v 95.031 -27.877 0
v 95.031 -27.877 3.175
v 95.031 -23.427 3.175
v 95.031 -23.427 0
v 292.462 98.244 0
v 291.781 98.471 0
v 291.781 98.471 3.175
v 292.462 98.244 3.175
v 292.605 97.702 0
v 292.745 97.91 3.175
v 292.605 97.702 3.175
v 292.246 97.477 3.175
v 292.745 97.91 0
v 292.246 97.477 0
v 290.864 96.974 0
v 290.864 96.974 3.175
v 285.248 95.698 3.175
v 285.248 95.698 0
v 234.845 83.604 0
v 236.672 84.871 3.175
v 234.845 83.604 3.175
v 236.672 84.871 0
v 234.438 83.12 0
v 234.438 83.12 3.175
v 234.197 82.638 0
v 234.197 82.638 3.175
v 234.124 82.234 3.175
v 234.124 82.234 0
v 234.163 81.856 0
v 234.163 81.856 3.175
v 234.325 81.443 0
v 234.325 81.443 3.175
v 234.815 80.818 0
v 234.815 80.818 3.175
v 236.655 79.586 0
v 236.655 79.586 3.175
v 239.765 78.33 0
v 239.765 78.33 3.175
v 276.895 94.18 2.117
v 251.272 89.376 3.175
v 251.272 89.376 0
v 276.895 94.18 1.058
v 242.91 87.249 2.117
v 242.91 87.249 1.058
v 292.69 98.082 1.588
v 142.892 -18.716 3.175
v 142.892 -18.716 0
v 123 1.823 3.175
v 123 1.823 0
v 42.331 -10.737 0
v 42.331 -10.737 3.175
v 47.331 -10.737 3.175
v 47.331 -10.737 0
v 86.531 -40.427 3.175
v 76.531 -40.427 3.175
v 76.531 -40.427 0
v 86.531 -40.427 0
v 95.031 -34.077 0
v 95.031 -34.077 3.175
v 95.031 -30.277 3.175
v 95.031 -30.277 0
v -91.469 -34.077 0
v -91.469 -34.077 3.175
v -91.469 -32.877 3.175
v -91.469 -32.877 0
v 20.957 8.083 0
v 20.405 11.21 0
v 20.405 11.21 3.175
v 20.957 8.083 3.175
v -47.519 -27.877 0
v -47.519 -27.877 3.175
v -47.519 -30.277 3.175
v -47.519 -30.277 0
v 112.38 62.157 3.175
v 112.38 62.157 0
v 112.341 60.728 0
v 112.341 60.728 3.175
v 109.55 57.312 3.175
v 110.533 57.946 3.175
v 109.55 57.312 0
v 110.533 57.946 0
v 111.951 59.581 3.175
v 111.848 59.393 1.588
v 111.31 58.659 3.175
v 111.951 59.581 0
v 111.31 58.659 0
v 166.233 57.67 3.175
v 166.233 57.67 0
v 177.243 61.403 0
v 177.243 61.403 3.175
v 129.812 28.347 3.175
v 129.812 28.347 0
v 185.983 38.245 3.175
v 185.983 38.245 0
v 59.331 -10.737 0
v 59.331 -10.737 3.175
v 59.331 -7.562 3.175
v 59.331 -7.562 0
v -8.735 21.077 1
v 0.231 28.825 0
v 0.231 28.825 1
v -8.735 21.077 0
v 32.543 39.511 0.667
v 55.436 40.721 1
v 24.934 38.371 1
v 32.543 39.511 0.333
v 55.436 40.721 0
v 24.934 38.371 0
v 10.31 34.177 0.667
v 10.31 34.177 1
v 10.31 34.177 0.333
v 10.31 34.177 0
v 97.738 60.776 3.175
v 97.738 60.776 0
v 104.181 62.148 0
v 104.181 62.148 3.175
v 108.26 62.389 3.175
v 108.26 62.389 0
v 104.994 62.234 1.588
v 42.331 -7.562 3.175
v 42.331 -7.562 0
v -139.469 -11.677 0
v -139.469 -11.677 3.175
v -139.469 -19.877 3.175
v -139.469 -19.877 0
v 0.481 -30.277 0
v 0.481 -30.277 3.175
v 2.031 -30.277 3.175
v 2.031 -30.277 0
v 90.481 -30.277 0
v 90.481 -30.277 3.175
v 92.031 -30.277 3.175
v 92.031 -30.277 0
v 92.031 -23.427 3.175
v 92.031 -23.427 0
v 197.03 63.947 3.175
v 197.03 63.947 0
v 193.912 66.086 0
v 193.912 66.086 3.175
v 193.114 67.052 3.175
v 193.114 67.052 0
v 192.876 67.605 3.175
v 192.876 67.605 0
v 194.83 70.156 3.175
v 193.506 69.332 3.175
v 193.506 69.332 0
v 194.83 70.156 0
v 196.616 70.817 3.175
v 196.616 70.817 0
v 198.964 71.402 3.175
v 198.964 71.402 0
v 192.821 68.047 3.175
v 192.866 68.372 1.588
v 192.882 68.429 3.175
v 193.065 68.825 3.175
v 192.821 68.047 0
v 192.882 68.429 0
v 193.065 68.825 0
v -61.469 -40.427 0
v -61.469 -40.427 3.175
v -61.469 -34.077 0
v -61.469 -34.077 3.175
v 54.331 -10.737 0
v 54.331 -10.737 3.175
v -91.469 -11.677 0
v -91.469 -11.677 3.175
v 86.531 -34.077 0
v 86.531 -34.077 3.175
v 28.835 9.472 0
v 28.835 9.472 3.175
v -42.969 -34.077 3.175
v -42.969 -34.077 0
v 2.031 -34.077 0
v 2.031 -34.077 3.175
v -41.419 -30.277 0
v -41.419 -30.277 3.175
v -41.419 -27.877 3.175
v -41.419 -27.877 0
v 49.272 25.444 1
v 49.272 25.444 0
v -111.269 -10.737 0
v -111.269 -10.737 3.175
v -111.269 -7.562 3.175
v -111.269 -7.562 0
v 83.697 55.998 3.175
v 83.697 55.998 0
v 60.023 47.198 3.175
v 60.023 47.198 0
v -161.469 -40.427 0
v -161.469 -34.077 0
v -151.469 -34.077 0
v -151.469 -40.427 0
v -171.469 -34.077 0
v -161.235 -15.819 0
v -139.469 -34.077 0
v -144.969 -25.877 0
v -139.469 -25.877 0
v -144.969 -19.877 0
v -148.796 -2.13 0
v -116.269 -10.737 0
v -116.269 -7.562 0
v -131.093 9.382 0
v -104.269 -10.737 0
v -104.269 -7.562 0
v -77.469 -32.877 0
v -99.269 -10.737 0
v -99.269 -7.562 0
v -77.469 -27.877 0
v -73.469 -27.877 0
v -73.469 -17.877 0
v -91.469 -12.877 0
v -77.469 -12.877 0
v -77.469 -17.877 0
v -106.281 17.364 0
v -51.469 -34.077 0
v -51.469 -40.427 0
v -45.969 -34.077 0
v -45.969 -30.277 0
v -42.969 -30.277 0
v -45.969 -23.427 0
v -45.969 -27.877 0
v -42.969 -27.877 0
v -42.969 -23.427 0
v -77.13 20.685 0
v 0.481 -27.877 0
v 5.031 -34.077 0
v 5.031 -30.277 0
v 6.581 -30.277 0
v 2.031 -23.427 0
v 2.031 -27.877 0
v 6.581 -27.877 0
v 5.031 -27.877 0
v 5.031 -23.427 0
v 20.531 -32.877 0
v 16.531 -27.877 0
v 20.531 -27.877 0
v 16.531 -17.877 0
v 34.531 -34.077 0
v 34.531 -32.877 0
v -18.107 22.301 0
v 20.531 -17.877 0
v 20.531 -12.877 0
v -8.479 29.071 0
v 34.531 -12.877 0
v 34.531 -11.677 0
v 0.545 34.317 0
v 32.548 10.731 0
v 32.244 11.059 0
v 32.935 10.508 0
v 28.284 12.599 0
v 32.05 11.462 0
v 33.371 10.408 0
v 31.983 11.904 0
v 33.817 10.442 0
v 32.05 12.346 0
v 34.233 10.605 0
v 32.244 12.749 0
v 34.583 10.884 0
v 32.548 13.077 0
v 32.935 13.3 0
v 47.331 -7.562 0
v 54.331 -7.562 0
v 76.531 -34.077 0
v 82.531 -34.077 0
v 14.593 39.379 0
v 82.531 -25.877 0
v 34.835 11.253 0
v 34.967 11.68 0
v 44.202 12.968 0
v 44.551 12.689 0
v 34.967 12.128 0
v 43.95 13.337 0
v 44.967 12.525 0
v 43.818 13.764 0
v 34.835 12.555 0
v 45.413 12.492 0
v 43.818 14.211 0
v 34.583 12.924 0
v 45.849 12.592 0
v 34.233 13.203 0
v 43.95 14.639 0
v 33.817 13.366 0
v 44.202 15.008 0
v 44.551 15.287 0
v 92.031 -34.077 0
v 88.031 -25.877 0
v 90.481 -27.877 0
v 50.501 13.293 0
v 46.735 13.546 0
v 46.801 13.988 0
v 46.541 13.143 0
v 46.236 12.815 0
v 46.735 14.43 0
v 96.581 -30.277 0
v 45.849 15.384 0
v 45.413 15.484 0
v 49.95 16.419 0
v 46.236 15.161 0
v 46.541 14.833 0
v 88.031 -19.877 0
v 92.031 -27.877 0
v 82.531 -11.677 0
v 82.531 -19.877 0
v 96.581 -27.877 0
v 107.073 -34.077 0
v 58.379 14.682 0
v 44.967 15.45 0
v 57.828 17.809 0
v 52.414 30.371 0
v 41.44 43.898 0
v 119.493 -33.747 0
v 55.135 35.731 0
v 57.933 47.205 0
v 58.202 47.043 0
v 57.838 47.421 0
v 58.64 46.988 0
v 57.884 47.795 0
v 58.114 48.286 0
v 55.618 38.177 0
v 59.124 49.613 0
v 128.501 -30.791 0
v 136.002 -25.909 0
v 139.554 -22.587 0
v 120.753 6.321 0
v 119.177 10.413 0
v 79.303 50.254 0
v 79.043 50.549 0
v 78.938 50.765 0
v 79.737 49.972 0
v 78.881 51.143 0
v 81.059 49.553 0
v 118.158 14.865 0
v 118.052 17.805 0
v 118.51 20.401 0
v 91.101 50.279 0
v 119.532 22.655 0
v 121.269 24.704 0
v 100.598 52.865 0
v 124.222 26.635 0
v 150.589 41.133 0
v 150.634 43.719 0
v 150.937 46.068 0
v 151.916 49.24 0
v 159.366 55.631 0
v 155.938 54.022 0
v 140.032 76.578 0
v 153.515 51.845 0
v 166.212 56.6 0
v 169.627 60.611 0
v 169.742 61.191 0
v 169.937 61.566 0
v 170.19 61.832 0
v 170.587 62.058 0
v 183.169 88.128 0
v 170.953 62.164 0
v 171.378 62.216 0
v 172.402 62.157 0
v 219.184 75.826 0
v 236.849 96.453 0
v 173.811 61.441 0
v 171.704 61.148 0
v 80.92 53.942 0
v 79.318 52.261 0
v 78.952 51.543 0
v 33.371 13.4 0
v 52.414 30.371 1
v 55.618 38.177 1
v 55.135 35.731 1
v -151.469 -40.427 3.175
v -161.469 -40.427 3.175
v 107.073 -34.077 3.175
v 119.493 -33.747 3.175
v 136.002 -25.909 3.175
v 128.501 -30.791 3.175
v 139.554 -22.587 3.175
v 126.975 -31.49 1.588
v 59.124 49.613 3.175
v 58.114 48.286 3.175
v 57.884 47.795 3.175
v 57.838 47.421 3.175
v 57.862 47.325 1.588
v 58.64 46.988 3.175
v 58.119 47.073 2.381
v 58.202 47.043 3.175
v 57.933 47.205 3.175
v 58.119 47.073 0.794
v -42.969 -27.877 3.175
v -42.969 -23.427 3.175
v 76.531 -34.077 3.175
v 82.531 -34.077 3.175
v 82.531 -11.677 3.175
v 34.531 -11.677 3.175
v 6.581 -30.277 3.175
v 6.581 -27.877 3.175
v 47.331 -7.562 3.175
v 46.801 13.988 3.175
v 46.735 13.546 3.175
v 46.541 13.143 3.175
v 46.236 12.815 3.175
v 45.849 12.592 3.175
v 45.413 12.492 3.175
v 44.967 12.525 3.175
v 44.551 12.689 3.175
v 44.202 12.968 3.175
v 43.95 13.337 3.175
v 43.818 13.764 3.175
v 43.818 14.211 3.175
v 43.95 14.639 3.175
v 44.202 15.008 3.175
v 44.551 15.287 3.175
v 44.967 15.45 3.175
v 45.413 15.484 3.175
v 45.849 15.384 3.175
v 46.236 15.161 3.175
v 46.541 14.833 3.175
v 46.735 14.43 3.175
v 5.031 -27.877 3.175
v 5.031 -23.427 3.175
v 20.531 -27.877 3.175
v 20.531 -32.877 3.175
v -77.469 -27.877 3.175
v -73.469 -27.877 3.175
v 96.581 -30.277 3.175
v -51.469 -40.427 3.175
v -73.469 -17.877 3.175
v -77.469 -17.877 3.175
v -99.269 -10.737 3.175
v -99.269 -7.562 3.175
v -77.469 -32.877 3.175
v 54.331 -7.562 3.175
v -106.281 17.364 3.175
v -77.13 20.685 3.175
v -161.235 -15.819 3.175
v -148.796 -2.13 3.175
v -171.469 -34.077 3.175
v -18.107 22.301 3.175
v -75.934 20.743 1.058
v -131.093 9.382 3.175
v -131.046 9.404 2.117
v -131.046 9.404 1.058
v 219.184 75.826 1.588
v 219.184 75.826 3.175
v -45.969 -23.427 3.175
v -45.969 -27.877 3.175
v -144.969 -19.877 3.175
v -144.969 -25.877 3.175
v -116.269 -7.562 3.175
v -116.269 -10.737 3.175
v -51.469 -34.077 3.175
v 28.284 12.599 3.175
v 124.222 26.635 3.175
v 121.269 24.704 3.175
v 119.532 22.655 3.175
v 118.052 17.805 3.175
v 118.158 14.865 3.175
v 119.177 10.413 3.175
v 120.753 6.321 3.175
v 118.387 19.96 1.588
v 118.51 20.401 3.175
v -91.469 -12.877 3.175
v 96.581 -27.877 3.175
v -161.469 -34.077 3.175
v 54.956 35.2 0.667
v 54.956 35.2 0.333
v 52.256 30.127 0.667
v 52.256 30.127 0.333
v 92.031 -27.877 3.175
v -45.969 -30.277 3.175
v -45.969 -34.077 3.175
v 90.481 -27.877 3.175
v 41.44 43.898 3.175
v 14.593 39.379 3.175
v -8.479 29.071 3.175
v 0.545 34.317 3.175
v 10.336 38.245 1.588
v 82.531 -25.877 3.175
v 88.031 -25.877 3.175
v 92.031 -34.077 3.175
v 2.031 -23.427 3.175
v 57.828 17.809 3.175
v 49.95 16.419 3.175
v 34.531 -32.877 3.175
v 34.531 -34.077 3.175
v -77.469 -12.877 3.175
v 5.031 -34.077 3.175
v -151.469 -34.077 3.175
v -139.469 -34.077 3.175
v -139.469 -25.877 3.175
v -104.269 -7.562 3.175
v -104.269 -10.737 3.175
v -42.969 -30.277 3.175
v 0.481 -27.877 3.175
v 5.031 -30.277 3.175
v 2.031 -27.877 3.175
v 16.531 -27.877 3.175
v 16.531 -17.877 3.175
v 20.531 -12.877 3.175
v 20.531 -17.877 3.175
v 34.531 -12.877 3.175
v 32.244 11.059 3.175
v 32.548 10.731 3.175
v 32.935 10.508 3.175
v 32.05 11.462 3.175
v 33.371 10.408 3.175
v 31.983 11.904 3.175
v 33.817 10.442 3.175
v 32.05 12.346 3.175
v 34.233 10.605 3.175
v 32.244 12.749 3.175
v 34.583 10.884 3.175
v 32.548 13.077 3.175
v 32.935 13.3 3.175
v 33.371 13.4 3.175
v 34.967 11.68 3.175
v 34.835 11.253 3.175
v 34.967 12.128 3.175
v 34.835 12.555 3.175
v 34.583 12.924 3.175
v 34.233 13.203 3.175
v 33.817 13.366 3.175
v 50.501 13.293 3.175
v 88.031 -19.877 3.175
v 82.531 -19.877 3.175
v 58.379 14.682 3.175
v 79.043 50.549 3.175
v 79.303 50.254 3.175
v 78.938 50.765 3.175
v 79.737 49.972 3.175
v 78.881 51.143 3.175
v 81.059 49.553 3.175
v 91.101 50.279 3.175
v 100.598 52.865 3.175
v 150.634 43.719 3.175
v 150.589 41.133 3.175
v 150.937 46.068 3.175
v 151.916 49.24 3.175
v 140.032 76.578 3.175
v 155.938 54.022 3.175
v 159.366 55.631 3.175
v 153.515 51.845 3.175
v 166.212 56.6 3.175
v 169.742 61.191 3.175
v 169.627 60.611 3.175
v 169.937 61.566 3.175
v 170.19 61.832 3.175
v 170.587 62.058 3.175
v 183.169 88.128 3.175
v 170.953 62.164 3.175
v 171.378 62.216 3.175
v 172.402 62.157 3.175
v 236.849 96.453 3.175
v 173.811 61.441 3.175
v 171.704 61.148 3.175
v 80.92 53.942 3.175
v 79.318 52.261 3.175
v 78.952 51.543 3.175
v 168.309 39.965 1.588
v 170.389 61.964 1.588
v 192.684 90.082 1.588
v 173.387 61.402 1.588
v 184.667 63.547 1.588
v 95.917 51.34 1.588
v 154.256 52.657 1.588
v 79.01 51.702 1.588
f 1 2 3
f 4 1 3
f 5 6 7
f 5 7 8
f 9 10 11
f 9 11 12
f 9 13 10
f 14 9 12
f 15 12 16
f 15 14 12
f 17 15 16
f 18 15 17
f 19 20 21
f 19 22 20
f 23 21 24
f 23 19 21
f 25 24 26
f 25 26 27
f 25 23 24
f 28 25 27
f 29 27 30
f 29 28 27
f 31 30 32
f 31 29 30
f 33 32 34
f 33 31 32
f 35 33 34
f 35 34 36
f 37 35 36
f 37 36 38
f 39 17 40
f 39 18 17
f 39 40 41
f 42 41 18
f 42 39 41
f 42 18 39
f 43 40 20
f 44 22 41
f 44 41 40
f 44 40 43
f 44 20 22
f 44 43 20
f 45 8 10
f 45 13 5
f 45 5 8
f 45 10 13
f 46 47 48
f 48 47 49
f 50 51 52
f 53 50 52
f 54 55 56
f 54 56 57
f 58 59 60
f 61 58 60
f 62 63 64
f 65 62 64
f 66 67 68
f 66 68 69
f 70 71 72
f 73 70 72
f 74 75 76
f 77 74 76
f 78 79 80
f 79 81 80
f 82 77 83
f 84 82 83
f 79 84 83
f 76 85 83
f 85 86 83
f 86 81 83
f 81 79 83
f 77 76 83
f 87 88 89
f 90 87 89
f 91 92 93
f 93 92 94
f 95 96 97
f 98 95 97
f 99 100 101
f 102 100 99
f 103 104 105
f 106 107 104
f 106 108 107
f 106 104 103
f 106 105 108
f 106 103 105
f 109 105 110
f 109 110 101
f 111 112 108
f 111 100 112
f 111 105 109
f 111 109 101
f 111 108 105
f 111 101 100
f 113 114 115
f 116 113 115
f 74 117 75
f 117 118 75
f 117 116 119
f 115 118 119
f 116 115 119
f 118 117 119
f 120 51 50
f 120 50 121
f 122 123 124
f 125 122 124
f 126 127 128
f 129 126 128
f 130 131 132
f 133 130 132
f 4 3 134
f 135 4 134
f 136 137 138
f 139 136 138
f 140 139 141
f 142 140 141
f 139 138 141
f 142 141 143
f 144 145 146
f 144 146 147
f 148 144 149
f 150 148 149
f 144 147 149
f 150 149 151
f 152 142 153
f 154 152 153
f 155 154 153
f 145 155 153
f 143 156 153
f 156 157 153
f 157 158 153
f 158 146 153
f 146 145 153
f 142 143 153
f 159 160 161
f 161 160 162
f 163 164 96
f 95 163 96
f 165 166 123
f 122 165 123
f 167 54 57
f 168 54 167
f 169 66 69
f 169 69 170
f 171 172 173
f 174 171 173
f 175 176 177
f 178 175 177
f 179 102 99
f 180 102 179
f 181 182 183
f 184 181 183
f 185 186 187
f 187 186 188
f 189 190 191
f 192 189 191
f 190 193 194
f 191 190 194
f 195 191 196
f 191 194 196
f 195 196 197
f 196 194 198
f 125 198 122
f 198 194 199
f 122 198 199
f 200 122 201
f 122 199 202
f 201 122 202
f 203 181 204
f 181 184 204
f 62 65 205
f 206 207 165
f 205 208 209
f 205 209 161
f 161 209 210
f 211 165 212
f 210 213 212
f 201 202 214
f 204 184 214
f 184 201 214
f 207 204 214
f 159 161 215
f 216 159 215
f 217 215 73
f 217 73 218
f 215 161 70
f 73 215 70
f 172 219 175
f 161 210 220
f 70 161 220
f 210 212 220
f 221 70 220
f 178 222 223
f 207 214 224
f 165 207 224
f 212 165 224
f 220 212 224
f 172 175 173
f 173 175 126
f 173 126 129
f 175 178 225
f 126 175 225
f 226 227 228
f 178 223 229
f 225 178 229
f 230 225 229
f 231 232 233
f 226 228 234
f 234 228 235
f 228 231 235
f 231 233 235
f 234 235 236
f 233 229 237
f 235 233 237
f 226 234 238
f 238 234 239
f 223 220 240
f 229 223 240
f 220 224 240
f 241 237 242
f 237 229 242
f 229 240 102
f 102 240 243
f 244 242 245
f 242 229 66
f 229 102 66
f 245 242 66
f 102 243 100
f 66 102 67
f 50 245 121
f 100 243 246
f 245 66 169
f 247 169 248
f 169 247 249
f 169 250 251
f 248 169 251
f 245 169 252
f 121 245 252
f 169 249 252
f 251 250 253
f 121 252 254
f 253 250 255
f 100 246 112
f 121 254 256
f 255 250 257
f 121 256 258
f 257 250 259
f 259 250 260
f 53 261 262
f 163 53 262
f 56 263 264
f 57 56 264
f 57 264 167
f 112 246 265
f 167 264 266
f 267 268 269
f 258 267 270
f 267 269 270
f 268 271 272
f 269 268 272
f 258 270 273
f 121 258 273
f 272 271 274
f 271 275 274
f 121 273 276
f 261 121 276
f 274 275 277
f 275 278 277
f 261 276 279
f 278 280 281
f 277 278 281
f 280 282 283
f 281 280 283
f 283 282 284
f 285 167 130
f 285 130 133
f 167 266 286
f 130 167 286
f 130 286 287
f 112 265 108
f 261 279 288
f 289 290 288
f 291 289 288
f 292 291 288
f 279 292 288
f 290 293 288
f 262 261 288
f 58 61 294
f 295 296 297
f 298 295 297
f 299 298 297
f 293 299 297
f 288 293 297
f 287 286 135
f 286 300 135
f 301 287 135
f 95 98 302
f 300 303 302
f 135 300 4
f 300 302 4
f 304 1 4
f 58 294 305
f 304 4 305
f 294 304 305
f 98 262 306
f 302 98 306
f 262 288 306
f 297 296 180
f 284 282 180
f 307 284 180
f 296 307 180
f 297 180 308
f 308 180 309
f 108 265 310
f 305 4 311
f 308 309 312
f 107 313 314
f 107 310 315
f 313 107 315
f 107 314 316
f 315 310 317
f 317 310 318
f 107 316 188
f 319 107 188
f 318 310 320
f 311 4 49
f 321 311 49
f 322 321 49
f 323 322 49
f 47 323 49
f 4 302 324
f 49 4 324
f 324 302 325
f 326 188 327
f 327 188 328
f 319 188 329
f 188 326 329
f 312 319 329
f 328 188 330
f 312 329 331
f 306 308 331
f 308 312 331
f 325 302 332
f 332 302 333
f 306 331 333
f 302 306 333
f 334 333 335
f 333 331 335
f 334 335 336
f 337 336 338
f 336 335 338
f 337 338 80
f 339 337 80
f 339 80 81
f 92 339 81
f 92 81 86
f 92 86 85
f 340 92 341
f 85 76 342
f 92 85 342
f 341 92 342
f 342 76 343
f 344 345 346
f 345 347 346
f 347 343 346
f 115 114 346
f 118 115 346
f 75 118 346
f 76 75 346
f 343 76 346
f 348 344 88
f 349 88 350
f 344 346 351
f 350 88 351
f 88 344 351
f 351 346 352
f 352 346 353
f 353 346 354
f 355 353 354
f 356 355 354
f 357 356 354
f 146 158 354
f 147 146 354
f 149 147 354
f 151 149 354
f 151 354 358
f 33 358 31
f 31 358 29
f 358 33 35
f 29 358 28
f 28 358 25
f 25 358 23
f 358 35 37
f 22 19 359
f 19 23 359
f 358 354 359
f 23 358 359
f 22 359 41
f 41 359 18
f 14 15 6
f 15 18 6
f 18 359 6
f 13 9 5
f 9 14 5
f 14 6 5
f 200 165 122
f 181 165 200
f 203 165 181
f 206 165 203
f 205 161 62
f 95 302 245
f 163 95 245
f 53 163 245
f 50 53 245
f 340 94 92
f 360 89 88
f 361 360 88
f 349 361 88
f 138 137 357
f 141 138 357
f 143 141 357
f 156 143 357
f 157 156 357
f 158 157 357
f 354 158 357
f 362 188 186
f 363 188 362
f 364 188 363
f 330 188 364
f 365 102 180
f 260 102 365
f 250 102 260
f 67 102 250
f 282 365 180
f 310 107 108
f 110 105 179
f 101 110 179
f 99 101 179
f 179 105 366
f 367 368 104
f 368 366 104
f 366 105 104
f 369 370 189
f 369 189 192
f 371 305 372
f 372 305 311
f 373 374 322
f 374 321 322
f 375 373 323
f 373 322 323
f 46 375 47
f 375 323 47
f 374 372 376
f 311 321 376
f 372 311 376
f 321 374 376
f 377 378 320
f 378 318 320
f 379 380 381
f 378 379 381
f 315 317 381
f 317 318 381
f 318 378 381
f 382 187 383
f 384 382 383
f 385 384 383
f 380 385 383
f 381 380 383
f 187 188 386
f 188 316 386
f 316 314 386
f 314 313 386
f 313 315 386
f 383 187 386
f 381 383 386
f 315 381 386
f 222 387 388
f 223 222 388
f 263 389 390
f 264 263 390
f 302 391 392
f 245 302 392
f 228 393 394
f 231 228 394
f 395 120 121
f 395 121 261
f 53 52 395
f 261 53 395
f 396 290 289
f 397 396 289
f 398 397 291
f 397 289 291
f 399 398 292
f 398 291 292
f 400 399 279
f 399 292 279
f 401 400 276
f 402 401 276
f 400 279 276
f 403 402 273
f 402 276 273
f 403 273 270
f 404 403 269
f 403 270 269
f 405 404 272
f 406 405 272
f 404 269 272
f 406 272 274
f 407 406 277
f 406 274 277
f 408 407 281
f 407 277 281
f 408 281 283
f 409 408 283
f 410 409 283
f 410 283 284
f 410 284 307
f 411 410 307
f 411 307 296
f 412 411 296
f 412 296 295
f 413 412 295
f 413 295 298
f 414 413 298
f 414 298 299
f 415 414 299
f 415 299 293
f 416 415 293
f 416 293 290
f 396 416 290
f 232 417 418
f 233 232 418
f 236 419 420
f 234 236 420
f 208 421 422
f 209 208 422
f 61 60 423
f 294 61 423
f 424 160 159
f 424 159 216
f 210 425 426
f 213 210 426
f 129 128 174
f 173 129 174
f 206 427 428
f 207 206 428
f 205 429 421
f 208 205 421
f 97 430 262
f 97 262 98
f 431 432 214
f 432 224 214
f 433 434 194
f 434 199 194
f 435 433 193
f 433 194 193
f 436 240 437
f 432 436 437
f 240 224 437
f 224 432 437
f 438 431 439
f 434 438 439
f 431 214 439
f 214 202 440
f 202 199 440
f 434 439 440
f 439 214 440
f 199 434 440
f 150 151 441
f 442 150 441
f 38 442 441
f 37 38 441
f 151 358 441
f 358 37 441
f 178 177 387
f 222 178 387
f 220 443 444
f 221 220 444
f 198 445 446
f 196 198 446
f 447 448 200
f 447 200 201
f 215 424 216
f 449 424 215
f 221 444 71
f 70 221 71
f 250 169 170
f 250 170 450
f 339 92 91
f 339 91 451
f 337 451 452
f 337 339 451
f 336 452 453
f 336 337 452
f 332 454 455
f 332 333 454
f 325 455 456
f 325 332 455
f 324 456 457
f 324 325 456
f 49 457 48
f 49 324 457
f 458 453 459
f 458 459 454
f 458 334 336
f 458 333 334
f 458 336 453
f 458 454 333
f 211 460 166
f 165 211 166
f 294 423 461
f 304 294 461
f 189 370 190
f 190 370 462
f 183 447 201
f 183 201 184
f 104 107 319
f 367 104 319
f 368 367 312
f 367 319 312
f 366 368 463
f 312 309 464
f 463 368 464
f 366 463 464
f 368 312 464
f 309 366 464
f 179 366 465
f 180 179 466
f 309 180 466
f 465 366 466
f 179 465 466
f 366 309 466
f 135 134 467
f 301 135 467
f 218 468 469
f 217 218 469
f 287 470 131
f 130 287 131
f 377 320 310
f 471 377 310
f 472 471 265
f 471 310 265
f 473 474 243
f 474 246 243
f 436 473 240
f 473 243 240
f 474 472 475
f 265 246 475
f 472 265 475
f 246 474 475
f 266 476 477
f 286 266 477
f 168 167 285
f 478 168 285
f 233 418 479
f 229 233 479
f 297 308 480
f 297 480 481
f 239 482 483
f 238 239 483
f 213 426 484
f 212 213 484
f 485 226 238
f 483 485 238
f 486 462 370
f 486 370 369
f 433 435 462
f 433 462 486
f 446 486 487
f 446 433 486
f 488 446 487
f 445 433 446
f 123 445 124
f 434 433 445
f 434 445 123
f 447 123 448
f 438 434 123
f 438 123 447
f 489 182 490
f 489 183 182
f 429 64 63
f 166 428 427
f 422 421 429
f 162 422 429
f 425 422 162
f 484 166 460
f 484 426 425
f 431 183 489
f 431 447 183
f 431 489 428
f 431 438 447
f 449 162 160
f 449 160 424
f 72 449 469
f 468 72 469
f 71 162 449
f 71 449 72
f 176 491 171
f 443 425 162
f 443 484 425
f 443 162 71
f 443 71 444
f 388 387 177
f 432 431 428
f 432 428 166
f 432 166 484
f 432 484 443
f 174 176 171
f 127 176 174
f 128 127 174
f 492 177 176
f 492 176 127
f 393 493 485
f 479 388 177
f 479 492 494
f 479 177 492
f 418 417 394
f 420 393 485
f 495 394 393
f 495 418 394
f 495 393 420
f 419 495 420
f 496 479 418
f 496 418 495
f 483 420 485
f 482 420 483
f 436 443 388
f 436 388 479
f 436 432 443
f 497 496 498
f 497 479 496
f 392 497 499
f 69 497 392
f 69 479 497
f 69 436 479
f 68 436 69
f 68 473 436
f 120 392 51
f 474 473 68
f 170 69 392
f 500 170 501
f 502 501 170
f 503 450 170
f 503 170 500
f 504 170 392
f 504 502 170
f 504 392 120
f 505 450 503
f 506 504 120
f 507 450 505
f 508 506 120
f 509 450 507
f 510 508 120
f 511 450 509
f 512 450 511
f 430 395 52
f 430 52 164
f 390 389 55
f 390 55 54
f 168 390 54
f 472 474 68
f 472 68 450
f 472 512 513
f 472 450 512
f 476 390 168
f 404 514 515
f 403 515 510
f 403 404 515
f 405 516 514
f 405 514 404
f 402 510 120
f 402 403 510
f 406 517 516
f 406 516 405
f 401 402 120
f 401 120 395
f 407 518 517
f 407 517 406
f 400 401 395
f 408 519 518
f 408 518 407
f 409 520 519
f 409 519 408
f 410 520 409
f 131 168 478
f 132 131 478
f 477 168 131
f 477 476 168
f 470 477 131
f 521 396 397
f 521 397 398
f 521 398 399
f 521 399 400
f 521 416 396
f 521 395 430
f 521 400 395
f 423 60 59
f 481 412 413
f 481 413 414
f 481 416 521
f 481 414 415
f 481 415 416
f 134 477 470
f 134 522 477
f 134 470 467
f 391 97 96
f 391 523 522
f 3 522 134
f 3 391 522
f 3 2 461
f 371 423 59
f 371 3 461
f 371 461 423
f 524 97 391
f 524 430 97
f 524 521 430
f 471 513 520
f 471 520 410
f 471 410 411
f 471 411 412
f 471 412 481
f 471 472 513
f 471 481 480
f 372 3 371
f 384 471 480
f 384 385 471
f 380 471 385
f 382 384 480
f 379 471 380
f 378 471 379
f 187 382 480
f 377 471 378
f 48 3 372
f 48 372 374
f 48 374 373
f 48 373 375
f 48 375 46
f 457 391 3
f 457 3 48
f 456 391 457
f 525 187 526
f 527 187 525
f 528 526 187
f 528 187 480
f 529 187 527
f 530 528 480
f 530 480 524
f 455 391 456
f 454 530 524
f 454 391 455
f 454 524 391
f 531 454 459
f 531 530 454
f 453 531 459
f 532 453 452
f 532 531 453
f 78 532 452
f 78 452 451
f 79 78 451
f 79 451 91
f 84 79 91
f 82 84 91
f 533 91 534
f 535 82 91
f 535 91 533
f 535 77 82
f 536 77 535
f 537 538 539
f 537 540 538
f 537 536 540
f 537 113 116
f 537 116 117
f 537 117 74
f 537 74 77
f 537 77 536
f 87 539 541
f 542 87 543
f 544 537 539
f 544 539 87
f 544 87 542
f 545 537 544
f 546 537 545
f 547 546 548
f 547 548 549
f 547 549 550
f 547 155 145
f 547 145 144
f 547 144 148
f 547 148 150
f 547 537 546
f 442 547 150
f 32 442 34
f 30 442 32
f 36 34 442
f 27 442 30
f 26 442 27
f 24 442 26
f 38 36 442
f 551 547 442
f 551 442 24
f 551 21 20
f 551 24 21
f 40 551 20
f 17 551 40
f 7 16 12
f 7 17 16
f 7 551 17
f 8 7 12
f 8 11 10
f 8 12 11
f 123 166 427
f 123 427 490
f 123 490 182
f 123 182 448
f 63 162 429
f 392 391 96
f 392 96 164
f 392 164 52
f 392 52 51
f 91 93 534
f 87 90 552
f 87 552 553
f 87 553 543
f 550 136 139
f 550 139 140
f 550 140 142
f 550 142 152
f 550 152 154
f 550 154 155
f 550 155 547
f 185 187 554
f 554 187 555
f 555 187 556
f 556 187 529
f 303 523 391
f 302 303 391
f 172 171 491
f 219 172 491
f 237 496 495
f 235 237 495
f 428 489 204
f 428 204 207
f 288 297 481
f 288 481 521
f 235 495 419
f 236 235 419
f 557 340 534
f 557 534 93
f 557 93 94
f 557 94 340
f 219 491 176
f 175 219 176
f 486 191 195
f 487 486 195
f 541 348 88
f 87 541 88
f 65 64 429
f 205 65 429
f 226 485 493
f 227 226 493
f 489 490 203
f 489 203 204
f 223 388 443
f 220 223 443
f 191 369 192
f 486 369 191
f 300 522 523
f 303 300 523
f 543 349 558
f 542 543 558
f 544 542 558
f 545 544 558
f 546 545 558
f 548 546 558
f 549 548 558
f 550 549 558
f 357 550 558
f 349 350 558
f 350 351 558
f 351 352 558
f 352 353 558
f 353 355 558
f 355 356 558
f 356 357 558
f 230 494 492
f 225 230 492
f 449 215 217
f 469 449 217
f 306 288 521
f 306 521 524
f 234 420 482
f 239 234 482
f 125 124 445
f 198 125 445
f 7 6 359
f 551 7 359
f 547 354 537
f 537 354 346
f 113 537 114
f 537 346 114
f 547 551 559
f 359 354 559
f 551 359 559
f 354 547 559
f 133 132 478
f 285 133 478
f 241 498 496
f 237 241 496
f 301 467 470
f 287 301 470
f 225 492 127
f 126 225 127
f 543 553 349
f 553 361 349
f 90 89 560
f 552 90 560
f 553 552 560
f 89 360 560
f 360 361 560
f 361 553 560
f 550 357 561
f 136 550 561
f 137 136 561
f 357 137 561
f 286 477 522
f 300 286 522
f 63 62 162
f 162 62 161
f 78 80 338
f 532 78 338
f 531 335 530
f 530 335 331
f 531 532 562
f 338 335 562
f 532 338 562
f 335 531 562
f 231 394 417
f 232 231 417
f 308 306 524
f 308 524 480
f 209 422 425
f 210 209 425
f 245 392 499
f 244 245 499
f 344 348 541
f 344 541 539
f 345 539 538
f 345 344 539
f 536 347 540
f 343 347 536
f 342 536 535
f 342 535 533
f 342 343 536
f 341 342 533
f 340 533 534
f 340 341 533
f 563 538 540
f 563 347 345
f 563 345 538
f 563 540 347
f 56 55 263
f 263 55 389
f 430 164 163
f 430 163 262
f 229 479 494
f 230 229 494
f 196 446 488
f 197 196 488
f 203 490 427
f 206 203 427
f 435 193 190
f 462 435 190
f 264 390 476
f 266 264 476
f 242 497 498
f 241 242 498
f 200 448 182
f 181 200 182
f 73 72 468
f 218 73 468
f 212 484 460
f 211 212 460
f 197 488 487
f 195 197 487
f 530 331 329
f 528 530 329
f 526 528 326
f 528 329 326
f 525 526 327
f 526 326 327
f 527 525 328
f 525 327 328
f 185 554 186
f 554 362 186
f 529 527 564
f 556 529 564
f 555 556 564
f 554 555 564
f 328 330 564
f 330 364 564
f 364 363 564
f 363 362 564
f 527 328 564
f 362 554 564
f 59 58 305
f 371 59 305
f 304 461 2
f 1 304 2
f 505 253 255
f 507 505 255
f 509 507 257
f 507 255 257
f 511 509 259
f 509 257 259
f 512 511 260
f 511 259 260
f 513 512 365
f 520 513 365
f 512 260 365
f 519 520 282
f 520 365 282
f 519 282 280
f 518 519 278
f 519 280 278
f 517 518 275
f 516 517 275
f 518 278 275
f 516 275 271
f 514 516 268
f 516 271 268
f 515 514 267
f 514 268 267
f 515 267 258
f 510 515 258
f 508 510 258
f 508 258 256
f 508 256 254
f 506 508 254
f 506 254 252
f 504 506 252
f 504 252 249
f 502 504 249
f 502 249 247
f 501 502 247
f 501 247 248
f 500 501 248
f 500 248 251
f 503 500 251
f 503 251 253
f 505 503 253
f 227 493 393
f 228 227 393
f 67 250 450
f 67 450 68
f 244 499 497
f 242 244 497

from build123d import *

# Parameters (mm, degrees)
BOSS_EXTRUDE1_DEPTH = 3.175
SKETCH3_W           = 10
SKETCH3_H           = 6.35
BOSS_EXTRUDE2_DEPTH = 3.175
CUT_EXTRUDE1_DEPTH  = 1
CUT_EXTRUDE2_DEPTH  = 309.914260869
SKETCH7_W           = 5
SKETCH7_H           = 3.175
CUT_EXTRUDE3_DEPTH  = 309.914260869
SKETCH8_R           = 1.5
CUT_EXTRUDE4_DEPTH  = 309.914260869


with BuildPart() as part:
    # Sketch2 → Boss-Extrude1 (new body)
    with BuildSketch(Plane.XY):
        with BuildLine():
            Line((-171.469047232, -34.076589663), (107.072734851, -34.076589663))
            add(Edge.make_bspline(
                [(107.072734851, -34.076589663), (128.968224532, -36.583015685), (142.892082906, -18.715522774)],
                knots=[0, 0, 0, 1, 1, 1], degree=2))
            Line((142.892082906, -18.715522774), (122.99960361, 1.8225486))
            add(Edge.make_bspline(
                [(129.812103759, 28.346921979), (110.367502019, 24.835662341), (122.99960361, 1.8225486)],
                knots=[0, 0, 0, 1, 1, 1], degree=2))
            Line((129.812103759, 28.346921979), (185.982982819, 38.244685161))
            add(Edge.make_bspline(
                [(150.588622768, 41.132714976), (168.332466646, 40.241827569), (185.982982819, 38.244685161)],
                knots=[0, 0, 0, 1, 1, 1], degree=2))
            add(Edge.make_bspline(
                [(166.211544782, 56.600045126), (150.111599454, 56.448151942), (150.588622768, 41.132714976)],
                knots=[0, 0, 0, 1, 1, 1], degree=2))
            Line((166.211544782, 56.600045126), (166.232711914, 57.669663084))
            Line((166.232711914, 57.669663084), (177.243348067, 61.403308501))
            add(Edge.make_bspline(
                [(177.243348067, 61.403308501), (173.339529375, 61.796609349), (169.627135034, 60.610840144)],
                knots=[0, 0, 0, 1, 1, 1], degree=2))
            add(Edge.make_bspline(
                [(169.627135034, 60.610840144), (169.762853876, 62.544945332), (172.402329475, 62.156522878)],
                knots=[0, 0, 0, 1, 1, 1], degree=2))
            add(Edge.make_bspline(
                [(172.402329475, 62.156522878), (184.617311888, 64.041519989), (197.029812567, 63.947302758)],
                knots=[0, 0, 0, 1, 1, 1], degree=2))
            add(Edge.make_bspline(
                [(197.029812567, 63.947302758), (187.73474396, 69.069639789), (198.964387884, 71.402059066)],
                knots=[0, 0, 0, 1, 1, 1], degree=2))
            add(Edge.make_bspline(
                [(198.964387884, 71.402059066), (219.003547299, 76.786528717), (239.76459105, 78.329887141)],
                knots=[0, 0, 0, 1, 1, 1], degree=2))
            add(Edge.make_bspline(
                [(291.780939868, 98.47138823), (303.090852198, 95.717715254), (210.844028254, 88.026417155), (239.76459105, 78.329887141)],
                knots=[0, 0, 0, 0, 1, 1, 1, 1], degree=3))
            add(Edge.make_bspline(
                [(291.780939868, 98.47138823), (190.608851514, 100.539390251), (97.737935683, 60.775941524)],
                knots=[0, 0, 0, 1, 1, 1], degree=2))
            add(Edge.make_bspline(
                [(97.737935683, 60.775941524), (104.92881908, 63.001143493), (112.379572637, 62.156522878)],
                knots=[0, 0, 0, 1, 1, 1], degree=2))
            add(Edge.make_bspline(
                [(112.379572637, 62.156522878), (112.730110756, 59.051830939), (109.55036868, 57.311722682)],
                knots=[0, 0, 0, 1, 1, 1], degree=2))
            add(Edge.make_bspline(
                [(109.55036868, 57.311722682), (96.530025853, 49.246897899), (81.058579137, 49.55282081)],
                knots=[0, 0, 0, 1, 1, 1], degree=2))
            add(Edge.make_bspline(
                [(81.058579137, 49.55282081), (75.642299748, 50.628036984), (83.696612356, 55.998318906)],
                knots=[0, 0, 0, 1, 1, 1], degree=2))
            Line((83.696612356, 55.998318906), (60.023408157, 47.198036308))
            add(Edge.make_bspline(
                [(60.023408157, 47.198036308), (56.150260782, 46.24516321), (59.12376331, 49.613311176)],
                knots=[0, 0, 0, 1, 1, 1], degree=2))
            add(Edge.make_bspline(
                [(59.12376331, 49.613311176), (44.292473838, 41.921501166), (13.209344651, 43.405332099), (-7.707186428, 29.993825045), (-18.106560521, 22.301338951)],
                knots=[0, 0, 0, 0, 0.606338938, 1, 1, 1, 1], degree=3))
            add(Edge.make_bspline(
                [(-18.106560521, 22.301338951), (-73.30010729, 18.178725753), (-142.381543794, 32.928841514), (-171.469047232, -34.076589663)],
                knots=[0, 0, 0, 0, 1, 1, 1, 1], degree=3))
        make_face()
    extrude(amount=BOSS_EXTRUDE1_DEPTH)

    # Sketch3 → Boss-Extrude2 (add)
    with BuildSketch(Plane.XY.offset(3.175)):
        with Locations((-156.469047232, -37.251589663)):
            Rectangle(SKETCH3_W, SKETCH3_H)
        with Locations((-56.469047232, -37.251589663)):
            Rectangle(SKETCH3_W, SKETCH3_H)
        with Locations((81.530952768, -37.251589663)):
            Rectangle(SKETCH3_W, SKETCH3_H)
    extrude(amount=-BOSS_EXTRUDE2_DEPTH)

    # Sketch4 → Cut-Extrude1 (cut)
    with BuildSketch(Plane.XY):
        with BuildLine():
            Line((-8.735344321, 21.076667257), (49.27249451, 25.443679203))
            add(Edge.make_bspline(
                [(55.435775055, 40.720887474), (56.710717132, 34.955549426), (51.7521577, 29.95185464), (49.27249451, 25.443679203)],
                knots=[0, 0, 0, 0, 1, 1, 1, 1], degree=3))
            add(Edge.make_bspline(
                [(55.435775055, 40.720887474), (33.054612951, 40.360145045), (7.874054379, 39.272954497), (-8.735344321, 21.076667257)],
                knots=[0, 0, 0, 0, 1, 1, 1, 1], degree=3))
        make_face()
    extrude(amount=CUT_EXTRUDE1_DEPTH, mode=Mode.SUBTRACT)

    # Sketch5 → Cut-Extrude2 (cut, through all)
    with BuildSketch(Plane.XY.offset(3.175)):
        Polygon((-45.969047232, -34.076589663), (-42.969047232, -34.076589663), (-42.969047232, -30.276589663), (-41.419047232, -30.276589663), (-41.419047232, -27.876589663), (-42.969047232, -27.876589663), (-42.969047232, -23.426589663), (-45.969047232, -23.426589663), (-45.969047232, -27.876589663), (-47.519047232, -27.876589663), (-47.519047232, -30.276589663), (-45.969047232, -30.276589663), align=None)
        Polygon((2.030952768, -30.276589663), (2.030952768, -34.076589663), (5.030952768, -34.076589663), (5.030952768, -30.276589663), (6.580952768, -30.276589663), (6.580952768, -27.876589663), (5.030952768, -27.876589663), (5.030952768, -23.426589663), (2.030952768, -23.426589663), (2.030952768, -27.876589663), (0.480952768, -27.876589663), (0.480952768, -30.276589663), align=None)
        Polygon((92.030952768, -30.276589663), (92.030952768, -34.076589663), (95.030952768, -34.076589663), (95.030952768, -30.276589663), (96.580952768, -30.276589663), (96.580952768, -27.876589663), (95.030952768, -27.876589663), (95.030952768, -23.426589663), (92.030952768, -23.426589663), (92.030952768, -27.876589663), (90.480952768, -27.876589663), (90.480952768, -30.276589663), align=None)
    extrude(amount=-CUT_EXTRUDE2_DEPTH, mode=Mode.SUBTRACT)

    # Sketch7 → Cut-Extrude3 (cut, through all)
    with BuildSketch(Plane.XY.offset(3.175)):
        Polygon((-91.469047232, -32.876589663), (-77.469047232, -32.876589663), (-77.469047232, -27.876589663), (-73.469047232, -27.876589663), (-73.469047232, -17.876589663), (-77.469047232, -17.876589663), (-77.469047232, -12.876589663), (-91.469047232, -12.876589663), (-91.469047232, -11.676589663), (-139.469047232, -11.676589663), (-139.469047232, -19.876589663), (-144.969047232, -19.876589663), (-144.969047232, -25.876589663), (-139.469047232, -25.876589663), (-139.469047232, -34.076589663), (-91.469047232, -34.076589663), align=None)
        Polygon((20.530952768, -27.876589663), (20.530952768, -32.876589663), (34.530952768, -32.876589663), (34.530952768, -34.076589663), (82.530952768, -34.076589663), (82.530952768, -25.876589663), (88.030952768, -25.876589663), (88.030952768, -19.876589663), (82.530952768, -19.876589663), (82.530952768, -11.676589663), (34.530952768, -11.676589663), (34.530952768, -12.876589663), (20.530952768, -12.876589663), (20.530952768, -17.876589663), (16.530952768, -17.876589663), (16.530952768, -27.876589663), align=None)
        with Locations((-113.769047232, -9.149089663)):
            Rectangle(SKETCH7_W, SKETCH7_H)
        with Locations((-101.769047232, -9.149089663)):
            Rectangle(SKETCH7_W, SKETCH7_H)
        with Locations((44.830952768, -9.149089663)):
            Rectangle(SKETCH7_W, SKETCH7_H)
        with Locations((56.830952768, -9.149089663)):
            Rectangle(SKETCH7_W, SKETCH7_H)
    extrude(amount=-CUT_EXTRUDE3_DEPTH, mode=Mode.SUBTRACT)

    # Sketch8 → Cut-Extrude4 (cut, through all)
    with BuildSketch(Plane(origin=(0, 0, 0), x_dir=(-1, 0, 0), z_dir=(0, 0, -1))):
        with Locations((-33.483463602, 11.904038041)):
            Circle(SKETCH8_R)
        with Locations(Location((-45.301156639, 13.987816173, 0), (0, 0, 180))):
            Circle(SKETCH8_R)
        Polygon((-20.405296331, 11.209994039), (-20.956629295, 8.083229423), (-28.835091319, 9.472414844), (-28.283758355, 12.59917946), align=None)
        Polygon((-49.949528922, 16.419439369), (-50.500861886, 13.292674753), (-58.37932391, 14.681860174), (-57.827990946, 17.80862479), align=None)
    extrude(amount=-CUT_EXTRUDE4_DEPTH, mode=Mode.SUBTRACT)


solid = part.part
